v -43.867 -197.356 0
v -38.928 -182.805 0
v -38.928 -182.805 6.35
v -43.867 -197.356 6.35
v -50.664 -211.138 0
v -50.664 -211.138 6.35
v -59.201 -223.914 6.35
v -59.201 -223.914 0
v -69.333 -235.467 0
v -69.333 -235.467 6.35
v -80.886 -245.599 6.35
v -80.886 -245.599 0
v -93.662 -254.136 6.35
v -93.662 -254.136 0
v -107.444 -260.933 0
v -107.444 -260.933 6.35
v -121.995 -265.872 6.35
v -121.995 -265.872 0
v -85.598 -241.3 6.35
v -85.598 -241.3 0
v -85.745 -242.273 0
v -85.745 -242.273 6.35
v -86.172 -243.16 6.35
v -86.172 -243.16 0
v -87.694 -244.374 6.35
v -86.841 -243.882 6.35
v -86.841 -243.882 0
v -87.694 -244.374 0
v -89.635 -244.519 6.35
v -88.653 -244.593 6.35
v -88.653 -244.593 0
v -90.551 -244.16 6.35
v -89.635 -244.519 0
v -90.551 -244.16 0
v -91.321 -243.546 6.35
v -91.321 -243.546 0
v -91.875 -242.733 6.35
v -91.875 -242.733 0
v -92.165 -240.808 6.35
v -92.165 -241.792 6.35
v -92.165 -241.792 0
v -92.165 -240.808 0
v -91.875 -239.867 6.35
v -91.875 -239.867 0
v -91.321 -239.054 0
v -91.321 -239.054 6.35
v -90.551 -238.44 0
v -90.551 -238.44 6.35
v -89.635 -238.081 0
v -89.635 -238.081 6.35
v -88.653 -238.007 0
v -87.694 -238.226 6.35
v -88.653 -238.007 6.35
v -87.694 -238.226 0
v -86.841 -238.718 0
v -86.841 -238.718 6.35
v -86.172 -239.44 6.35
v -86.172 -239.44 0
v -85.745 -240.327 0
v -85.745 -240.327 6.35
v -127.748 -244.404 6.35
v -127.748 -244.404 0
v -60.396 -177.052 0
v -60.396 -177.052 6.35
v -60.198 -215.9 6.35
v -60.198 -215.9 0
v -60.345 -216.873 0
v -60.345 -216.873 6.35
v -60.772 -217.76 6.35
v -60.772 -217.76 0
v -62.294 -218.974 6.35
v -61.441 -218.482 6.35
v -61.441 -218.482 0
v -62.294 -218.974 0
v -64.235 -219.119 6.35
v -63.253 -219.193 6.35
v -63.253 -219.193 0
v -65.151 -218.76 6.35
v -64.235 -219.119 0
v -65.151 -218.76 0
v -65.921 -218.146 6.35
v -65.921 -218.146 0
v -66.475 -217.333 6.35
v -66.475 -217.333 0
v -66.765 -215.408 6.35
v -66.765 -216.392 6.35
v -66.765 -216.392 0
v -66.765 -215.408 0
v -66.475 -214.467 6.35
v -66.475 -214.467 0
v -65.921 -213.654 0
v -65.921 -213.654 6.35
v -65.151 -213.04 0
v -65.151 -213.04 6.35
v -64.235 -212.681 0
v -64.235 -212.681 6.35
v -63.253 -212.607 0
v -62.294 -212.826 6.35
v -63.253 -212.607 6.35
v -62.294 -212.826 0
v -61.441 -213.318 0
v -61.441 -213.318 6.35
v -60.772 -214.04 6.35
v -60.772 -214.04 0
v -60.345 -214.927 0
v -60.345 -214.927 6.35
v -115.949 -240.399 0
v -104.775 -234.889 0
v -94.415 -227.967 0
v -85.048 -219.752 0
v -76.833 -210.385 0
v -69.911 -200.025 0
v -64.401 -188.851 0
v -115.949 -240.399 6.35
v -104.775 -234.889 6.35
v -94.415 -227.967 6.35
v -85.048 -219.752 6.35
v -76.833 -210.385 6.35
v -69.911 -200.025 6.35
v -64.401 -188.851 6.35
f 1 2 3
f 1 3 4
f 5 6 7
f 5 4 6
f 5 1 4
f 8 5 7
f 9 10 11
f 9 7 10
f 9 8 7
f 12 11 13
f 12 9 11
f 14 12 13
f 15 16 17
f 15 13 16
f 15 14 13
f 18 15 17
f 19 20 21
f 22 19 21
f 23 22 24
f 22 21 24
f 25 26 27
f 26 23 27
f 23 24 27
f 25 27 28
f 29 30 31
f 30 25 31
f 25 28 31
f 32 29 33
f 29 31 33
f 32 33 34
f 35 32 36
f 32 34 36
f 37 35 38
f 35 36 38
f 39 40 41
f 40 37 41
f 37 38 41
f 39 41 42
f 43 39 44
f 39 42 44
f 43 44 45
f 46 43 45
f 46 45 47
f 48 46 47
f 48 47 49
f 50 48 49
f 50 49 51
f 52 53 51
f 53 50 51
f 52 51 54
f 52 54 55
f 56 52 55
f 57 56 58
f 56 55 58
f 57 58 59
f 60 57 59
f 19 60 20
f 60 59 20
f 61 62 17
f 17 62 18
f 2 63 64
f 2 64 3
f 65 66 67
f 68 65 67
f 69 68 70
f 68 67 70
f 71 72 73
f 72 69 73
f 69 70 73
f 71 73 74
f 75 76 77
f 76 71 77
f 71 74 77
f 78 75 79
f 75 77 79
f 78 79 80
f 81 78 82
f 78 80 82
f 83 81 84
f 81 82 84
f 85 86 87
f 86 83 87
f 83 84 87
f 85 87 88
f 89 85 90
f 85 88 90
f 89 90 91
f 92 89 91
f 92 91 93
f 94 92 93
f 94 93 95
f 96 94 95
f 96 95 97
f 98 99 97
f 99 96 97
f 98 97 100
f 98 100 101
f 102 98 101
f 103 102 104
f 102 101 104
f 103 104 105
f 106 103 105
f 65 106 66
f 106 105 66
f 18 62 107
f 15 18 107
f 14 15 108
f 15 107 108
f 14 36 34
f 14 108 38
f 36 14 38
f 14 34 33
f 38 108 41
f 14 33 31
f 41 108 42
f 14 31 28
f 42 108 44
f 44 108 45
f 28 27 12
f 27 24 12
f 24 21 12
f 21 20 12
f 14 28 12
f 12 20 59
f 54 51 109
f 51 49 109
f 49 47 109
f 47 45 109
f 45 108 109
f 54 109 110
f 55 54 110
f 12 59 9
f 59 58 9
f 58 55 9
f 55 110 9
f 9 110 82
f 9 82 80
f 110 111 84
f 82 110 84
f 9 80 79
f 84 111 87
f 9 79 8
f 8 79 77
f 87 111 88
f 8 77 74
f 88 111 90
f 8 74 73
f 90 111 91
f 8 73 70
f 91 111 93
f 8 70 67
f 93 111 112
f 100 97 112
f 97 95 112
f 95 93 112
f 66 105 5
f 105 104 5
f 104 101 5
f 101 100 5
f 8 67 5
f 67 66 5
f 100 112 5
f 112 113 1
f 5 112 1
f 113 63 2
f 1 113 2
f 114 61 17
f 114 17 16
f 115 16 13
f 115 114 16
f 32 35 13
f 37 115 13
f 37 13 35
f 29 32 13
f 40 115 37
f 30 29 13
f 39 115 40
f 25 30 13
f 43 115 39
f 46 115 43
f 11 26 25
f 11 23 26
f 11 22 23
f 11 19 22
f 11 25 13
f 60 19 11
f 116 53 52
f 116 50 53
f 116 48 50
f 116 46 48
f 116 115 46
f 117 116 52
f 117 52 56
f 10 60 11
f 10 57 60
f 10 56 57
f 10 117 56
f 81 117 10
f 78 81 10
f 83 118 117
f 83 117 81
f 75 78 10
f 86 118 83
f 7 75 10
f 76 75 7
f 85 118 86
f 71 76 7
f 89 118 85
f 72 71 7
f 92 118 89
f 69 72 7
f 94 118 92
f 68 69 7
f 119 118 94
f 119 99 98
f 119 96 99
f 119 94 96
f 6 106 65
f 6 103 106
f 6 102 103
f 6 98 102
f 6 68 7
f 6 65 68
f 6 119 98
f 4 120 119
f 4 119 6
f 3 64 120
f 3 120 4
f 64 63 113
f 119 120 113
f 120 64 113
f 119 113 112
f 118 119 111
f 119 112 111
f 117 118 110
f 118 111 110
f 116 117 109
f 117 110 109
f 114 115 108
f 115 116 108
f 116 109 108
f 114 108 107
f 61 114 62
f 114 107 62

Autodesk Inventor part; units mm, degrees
ref_plane "YZ Plane" through (0, 0, 0) normal (1, 0, 0) x (0, 1, 0)
ref_plane "XZ Plane" through (0, 0, 0) normal (0, 1, 0) x (-1, 0, 0)
ref_plane "XY Plane" through (0, 0, 0) normal (0, 0, 1) x (1, 0, 0)
ref_plane "Work Plane1" through (0, 0, 0) normal (0, 0, 1) x (1, 0, 0)
sketch "Sketch1" plane through (0, 0, 0) normal (0, 0, 1) x (1, 0, 0)
  line L0 (0, 0) -> (-152.4, 0)
  circle A0 centre (-38.1, -165.1) radius 2.8067 construction
  line L1 (-60.3956, -177.0525) -> (-38.9279, -182.8048)
  line L2 (-127.7475, -244.4044) -> (-121.9952, -265.8721)
  arc A1 (-127.7475, -244.4044) -> (-60.3956, -177.0525) centre (-152.4, -152.4) ccw
  arc A2 (-121.9952, -265.8721) -> (-38.9279, -182.8048) centre (-152.4, -152.4) ccw
  line L3 (0, 0) -> (-63.5, 0)
  line L4 (-63.5, 0) -> (-63.5, -215.9) construction
  line L5 (-63.5, -215.9) -> (-88.9, -215.9) construction
  line L6 (-88.9, -215.9) -> (-88.9, -241.3) construction
  circle A3 centre (-63.5, -215.9) radius 3.302
  circle A4 centre (-88.9, -241.3) radius 3.302
  dimension "d0" = 152.4
  dimension "d8" = 63.5
  dimension "d9" = 215.9
  dimension "d10" = 25.4
  dimension "d11" = 25.4
  dimension "d12" = 6.604
  dimension "d13" = 6.604
extrude "Extrusion1" add sketch "Sketch1" along normal blind 6.35
properties part number "vrRig_v08_ballCupAlignment"
